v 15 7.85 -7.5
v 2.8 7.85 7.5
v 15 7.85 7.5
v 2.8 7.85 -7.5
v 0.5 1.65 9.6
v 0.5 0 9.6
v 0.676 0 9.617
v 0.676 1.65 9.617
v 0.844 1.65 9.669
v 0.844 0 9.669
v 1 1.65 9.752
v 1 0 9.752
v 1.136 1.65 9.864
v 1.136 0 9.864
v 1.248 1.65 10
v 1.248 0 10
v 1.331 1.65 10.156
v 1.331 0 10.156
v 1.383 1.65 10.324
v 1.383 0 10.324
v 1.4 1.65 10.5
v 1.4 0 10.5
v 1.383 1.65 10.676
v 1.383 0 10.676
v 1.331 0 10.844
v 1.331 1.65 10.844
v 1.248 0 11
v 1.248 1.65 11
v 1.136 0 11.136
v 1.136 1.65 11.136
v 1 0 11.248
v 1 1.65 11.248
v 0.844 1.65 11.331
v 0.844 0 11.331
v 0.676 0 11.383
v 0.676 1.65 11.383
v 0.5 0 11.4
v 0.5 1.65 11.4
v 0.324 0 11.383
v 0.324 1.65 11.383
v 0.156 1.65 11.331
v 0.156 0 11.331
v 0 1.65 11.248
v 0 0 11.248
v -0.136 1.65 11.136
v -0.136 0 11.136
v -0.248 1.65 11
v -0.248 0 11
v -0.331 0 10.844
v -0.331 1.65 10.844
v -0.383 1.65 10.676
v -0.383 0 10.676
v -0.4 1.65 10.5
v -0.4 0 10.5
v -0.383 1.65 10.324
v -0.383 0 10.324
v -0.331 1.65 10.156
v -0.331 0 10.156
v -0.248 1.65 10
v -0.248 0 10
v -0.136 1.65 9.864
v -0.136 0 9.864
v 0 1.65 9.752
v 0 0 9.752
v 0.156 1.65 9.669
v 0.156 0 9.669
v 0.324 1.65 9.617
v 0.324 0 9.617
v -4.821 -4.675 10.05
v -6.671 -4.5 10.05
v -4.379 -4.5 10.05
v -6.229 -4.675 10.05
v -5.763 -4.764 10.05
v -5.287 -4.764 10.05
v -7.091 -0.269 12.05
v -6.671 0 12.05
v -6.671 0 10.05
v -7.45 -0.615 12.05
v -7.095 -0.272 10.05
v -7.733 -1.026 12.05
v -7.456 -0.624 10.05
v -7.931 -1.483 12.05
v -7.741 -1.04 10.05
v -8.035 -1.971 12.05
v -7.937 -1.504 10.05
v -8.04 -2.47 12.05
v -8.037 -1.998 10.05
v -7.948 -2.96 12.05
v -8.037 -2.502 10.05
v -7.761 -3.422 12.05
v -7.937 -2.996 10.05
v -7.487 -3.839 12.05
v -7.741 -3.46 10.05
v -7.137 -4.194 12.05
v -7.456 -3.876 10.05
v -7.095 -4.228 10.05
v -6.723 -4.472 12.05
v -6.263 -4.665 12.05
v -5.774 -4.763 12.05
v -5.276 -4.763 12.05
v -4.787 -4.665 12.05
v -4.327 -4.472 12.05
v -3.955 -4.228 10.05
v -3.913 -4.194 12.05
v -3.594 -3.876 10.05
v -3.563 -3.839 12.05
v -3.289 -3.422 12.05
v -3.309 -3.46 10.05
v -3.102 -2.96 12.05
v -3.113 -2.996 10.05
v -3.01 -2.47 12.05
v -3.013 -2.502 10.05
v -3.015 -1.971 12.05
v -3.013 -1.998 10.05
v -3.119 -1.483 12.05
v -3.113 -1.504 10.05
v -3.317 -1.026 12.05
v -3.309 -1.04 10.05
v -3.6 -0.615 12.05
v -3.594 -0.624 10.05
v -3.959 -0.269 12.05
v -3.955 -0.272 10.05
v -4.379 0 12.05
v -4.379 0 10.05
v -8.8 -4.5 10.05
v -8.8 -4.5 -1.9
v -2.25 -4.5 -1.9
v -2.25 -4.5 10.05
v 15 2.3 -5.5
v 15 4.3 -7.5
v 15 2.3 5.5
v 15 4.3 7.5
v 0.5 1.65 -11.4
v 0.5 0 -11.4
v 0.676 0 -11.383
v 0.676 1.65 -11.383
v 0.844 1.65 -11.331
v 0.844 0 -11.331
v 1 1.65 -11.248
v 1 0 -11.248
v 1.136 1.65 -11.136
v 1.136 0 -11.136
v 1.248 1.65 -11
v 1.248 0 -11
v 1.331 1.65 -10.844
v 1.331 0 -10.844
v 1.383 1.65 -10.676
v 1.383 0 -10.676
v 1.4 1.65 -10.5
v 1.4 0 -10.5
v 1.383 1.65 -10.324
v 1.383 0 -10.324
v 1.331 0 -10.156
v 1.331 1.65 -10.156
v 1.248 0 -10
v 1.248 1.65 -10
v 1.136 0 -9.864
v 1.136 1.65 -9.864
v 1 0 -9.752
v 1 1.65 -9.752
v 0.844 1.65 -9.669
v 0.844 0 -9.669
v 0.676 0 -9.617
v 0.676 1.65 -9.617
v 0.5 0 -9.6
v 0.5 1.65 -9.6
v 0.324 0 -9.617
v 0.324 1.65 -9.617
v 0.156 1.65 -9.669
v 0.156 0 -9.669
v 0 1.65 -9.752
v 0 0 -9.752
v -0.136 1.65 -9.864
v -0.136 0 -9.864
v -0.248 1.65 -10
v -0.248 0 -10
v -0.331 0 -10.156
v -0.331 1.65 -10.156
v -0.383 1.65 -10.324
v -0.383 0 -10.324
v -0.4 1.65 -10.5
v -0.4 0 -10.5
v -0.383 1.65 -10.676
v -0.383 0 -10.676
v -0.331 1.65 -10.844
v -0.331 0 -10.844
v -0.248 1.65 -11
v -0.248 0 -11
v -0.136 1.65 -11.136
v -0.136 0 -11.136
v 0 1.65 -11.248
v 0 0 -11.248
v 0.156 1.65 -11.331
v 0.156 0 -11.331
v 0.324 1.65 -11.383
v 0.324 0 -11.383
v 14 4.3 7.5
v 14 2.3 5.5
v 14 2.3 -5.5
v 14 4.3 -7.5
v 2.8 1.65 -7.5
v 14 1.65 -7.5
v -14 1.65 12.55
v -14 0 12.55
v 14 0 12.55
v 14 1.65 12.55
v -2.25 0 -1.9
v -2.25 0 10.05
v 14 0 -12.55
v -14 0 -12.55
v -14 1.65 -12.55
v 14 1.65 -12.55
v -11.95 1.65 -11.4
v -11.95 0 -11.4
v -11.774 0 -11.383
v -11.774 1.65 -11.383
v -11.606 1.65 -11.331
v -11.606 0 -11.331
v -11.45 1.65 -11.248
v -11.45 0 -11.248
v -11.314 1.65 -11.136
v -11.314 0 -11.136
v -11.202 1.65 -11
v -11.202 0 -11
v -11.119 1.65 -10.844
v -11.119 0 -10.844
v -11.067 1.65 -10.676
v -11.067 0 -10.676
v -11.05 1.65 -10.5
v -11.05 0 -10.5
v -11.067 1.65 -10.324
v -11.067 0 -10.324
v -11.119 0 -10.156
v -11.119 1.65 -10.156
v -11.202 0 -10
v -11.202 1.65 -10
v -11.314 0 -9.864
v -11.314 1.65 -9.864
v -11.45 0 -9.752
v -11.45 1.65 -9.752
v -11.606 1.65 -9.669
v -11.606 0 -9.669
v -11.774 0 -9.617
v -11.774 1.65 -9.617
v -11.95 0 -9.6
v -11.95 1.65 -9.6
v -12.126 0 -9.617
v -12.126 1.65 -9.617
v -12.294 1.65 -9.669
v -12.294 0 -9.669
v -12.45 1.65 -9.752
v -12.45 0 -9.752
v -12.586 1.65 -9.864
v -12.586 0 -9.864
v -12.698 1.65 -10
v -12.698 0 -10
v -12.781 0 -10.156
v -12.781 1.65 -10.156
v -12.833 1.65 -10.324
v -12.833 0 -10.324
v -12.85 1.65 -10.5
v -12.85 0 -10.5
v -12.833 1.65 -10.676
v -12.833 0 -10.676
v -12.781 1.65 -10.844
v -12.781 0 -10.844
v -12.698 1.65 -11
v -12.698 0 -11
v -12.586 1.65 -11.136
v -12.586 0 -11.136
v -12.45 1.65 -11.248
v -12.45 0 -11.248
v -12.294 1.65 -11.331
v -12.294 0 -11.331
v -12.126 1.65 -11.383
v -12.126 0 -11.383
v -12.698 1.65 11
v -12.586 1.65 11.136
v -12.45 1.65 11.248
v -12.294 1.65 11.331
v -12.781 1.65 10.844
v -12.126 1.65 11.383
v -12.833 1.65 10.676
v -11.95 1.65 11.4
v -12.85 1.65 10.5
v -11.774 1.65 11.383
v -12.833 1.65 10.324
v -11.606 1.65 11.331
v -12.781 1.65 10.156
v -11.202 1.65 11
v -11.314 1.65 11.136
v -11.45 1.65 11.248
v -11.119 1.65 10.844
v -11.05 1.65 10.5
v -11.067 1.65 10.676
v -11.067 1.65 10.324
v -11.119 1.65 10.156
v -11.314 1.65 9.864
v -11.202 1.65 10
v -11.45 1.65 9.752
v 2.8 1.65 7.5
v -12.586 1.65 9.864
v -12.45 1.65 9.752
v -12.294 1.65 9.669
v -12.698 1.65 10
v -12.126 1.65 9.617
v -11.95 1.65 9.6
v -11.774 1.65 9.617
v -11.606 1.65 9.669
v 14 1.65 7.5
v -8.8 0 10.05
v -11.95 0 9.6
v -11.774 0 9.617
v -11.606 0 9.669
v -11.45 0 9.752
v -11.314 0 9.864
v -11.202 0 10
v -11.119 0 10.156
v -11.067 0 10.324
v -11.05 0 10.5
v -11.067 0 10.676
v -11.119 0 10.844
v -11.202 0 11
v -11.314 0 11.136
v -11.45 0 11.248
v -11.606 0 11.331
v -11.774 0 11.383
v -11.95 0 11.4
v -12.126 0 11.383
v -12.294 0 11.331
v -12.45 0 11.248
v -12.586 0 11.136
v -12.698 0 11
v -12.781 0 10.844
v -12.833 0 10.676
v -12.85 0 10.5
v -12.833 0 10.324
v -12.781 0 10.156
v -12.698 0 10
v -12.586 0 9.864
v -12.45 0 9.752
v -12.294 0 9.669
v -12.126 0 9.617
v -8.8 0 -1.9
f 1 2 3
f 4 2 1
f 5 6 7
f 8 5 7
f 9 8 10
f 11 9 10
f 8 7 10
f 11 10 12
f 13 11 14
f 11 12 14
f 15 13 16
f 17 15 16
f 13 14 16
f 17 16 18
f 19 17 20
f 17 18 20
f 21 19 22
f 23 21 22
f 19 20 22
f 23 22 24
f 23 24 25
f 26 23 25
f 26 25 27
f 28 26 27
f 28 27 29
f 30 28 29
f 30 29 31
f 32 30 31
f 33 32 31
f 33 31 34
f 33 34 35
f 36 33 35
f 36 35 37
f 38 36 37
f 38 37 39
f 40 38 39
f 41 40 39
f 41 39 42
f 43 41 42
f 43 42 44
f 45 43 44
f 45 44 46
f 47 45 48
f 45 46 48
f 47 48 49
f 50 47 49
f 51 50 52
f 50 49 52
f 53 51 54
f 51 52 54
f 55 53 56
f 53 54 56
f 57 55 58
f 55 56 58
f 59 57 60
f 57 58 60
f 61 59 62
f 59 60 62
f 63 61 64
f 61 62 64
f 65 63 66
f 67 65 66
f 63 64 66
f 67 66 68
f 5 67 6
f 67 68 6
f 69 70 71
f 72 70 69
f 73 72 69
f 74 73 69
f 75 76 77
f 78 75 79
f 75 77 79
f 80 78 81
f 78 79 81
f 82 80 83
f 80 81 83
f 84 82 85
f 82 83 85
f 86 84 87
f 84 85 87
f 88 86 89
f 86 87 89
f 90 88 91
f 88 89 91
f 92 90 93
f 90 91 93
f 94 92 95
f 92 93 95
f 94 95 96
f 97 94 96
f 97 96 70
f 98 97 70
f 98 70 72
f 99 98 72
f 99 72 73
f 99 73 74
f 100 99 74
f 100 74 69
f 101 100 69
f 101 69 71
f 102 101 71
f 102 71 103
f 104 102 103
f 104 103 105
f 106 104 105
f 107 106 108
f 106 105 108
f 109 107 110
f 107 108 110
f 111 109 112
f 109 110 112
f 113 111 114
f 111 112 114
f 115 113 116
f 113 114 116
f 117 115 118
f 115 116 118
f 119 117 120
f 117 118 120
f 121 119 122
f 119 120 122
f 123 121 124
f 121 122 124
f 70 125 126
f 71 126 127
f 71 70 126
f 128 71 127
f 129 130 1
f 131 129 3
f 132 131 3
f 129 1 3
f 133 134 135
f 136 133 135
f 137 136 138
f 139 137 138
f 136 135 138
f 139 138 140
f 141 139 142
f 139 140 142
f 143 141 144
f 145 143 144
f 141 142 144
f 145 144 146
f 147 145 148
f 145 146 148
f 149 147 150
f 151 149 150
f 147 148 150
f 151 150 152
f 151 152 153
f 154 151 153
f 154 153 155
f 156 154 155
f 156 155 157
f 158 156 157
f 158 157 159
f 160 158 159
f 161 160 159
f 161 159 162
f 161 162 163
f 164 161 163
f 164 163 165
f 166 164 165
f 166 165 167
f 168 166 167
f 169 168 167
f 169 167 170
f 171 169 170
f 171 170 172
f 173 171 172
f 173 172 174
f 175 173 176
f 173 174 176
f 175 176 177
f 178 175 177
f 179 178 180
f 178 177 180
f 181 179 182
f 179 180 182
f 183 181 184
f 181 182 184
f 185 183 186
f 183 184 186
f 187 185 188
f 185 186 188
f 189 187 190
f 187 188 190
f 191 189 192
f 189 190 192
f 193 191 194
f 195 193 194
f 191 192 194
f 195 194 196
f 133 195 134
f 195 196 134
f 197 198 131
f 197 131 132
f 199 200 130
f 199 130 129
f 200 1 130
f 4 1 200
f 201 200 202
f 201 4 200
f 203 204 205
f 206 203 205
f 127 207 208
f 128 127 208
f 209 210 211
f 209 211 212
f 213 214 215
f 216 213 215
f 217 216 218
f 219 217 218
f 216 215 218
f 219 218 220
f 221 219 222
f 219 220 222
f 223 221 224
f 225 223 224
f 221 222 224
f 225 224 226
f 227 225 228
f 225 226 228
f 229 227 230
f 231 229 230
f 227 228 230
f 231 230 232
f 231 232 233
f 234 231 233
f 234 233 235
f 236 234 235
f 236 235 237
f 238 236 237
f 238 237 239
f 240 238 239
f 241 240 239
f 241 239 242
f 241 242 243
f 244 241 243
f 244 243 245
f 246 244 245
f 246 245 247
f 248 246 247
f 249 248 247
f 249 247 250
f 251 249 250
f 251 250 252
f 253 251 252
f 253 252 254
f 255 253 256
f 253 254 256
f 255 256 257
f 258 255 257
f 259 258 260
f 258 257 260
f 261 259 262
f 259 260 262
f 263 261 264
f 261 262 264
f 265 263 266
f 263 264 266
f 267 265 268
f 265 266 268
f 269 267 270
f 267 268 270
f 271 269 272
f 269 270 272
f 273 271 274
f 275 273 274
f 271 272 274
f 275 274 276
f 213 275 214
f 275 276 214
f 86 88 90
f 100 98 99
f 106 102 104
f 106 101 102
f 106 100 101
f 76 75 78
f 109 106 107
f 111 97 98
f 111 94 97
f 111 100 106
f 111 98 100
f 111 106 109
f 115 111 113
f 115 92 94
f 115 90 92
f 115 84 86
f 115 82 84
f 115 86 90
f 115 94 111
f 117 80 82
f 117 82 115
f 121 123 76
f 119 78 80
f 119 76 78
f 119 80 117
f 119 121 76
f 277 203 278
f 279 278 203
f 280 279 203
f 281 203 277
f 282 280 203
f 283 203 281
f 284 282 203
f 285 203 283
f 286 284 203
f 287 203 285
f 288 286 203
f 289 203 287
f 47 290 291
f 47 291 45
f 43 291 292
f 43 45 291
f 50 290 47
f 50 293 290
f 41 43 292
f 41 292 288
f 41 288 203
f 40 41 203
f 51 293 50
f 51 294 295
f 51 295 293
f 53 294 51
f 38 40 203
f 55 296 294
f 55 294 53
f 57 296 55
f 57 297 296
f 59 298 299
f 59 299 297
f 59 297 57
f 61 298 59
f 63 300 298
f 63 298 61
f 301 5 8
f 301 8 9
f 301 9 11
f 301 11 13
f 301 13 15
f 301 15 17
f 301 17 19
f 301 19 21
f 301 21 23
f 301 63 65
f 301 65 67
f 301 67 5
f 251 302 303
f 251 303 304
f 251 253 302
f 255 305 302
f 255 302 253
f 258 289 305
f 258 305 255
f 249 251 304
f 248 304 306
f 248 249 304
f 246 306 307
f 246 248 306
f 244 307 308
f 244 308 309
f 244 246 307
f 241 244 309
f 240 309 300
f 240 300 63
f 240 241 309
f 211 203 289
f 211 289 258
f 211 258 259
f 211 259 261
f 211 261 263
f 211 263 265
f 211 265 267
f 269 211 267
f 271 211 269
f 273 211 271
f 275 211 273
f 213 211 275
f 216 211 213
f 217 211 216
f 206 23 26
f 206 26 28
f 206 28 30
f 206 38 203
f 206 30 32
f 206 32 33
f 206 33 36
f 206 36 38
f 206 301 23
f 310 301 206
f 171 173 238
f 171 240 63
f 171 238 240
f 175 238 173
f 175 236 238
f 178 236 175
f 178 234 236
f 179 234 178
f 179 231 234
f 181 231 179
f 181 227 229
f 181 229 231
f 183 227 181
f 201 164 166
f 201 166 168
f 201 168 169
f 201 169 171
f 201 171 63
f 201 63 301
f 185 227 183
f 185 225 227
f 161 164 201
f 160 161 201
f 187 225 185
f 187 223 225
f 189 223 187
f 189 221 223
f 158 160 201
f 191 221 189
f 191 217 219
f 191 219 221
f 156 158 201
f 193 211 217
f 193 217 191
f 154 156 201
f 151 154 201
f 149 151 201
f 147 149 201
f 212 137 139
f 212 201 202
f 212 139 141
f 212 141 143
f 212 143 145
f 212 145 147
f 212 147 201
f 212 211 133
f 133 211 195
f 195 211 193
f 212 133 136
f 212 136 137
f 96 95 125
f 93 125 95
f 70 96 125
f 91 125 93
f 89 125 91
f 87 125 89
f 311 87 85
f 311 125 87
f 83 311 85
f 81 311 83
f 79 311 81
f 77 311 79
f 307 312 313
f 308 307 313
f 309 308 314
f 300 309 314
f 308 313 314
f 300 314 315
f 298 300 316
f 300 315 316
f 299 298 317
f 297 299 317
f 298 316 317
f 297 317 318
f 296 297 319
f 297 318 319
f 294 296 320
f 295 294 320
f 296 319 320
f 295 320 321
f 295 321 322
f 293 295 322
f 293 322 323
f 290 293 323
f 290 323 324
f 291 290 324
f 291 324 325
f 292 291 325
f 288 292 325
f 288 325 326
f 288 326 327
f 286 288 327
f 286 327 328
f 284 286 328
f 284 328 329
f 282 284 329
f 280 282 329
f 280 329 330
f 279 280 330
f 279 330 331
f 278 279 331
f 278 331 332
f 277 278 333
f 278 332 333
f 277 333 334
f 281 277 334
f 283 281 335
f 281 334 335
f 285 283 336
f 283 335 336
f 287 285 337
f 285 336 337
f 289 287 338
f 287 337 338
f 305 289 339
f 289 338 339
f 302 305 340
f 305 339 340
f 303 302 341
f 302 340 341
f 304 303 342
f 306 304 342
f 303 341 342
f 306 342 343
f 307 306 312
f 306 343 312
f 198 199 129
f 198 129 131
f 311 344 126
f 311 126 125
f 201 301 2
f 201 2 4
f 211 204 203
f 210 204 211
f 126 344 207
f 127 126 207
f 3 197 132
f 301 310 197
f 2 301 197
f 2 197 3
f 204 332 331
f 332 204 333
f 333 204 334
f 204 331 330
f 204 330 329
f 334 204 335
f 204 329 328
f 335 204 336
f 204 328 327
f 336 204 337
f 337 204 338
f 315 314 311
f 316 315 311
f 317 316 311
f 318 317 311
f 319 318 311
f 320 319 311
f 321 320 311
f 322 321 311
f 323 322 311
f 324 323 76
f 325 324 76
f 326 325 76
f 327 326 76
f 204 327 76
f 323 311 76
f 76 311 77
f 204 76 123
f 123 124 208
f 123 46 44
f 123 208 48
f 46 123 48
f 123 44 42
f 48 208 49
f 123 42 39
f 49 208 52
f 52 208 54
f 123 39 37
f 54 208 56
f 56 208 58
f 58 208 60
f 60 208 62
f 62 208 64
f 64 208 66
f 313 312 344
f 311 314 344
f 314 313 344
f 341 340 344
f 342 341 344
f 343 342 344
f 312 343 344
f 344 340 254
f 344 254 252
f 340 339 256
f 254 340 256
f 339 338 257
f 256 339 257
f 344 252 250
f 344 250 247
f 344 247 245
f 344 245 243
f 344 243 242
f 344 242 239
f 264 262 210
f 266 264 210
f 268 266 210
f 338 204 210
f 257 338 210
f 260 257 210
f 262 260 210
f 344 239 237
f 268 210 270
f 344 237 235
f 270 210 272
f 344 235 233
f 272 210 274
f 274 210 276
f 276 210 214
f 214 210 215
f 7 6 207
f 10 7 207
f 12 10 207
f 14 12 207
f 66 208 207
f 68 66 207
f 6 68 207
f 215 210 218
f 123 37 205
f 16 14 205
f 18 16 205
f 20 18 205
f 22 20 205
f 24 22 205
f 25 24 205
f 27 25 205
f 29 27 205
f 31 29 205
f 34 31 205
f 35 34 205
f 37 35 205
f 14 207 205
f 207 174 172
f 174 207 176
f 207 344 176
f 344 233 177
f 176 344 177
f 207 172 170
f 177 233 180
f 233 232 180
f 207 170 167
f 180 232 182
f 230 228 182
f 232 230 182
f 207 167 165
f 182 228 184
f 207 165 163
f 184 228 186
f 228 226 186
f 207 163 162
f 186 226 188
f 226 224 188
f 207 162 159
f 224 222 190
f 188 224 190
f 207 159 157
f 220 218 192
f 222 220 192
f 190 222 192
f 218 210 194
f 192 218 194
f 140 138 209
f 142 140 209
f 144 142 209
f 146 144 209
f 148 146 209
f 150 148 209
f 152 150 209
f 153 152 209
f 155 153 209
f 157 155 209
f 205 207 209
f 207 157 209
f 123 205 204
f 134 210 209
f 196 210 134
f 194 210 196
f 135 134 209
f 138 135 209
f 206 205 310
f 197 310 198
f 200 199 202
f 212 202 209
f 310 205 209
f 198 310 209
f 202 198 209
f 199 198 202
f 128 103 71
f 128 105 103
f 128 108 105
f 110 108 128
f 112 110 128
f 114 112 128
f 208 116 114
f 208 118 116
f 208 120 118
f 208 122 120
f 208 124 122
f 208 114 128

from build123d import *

# Parameters (mm, degrees)
SKETCH1_W           = 28
SKETCH1_H           = 25.1
BOSS_EXTRUDE1_DEPTH = 1.65
SKETCH2_W           = 11.2
SKETCH2_H           = 15
BOSS_EXTRUDE2_DEPTH = 6.2
BOSS_EXTRUDE3_DEPTH = 1
SKETCH4_W           = 6.55
SKETCH4_H           = 11.95
BOSS_EXTRUDE4_DEPTH = 4.5
SKETCH5_R           = 2.525
BOSS_EXTRUDE5_DEPTH = 2
SKETCH6_R           = 0.9
CUT_EXTRUDE1_DEPTH  = 22.074273416


with BuildPart() as part:
    # Sketch1 → Boss-Extrude1 (new body)
    with BuildSketch(Plane(origin=(0, 0, 0), x_dir=(1, 0, 0), z_dir=(0, 1, 0))):
        Rectangle(SKETCH1_W, SKETCH1_H)
    extrude(amount=BOSS_EXTRUDE1_DEPTH)

    # Sketch2 → Boss-Extrude2 (add)
    with BuildSketch(Plane(origin=(0, 1.65, 0), x_dir=(1, 0, 0), z_dir=(0, 1, 0))):
        with Locations((8.4, 0)):
            Rectangle(SKETCH2_W, SKETCH2_H)
    extrude(amount=BOSS_EXTRUDE2_DEPTH)

    # Sketch3 → Boss-Extrude3 (add)
    with BuildSketch(Plane(origin=(14, 0, 0), x_dir=(0, 0, -1), z_dir=(1, 0, 0))):
        Polygon((-7.5, 4.3), (-7.5, 7.85), (7.5, 7.85), (7.5, 4.3), (5.5, 2.3), (-5.5, 2.3), align=None)
    extrude(amount=BOSS_EXTRUDE3_DEPTH)

    # Sketch4 → Boss-Extrude4 (add)
    with BuildSketch(Plane.XZ):
        with Locations((-5.525, 4.075)):
            Rectangle(SKETCH4_W, SKETCH4_H)
    extrude(amount=BOSS_EXTRUDE4_DEPTH)

    # Sketch5 → Boss-Extrude5 (add)
    with BuildSketch(Plane.XY.offset(10.05)):
        with Locations((-5.525, -2.25)):
            Circle(SKETCH5_R)
    extrude(amount=BOSS_EXTRUDE5_DEPTH)

    # Sketch6 → Cut-Extrude1 (cut, through all)
    with BuildSketch(Plane(origin=(0, 0, 0), x_dir=(-1, 0, 0), z_dir=(0, -1, 0))):
        with Locations(Location((11.95, -10.5, 0), (0, 0, 90))):
            Circle(SKETCH6_R)
        with Locations(Location((11.95, 10.5, 0), (0, 0, 90))):
            Circle(SKETCH6_R)
        with Locations(Location((-0.5, 10.5, 0), (0, 0, 90))):
            Circle(SKETCH6_R)
        with Locations(Location((-0.5, -10.5, 0), (0, 0, 90))):
            Circle(SKETCH6_R)
    extrude(amount=-CUT_EXTRUDE1_DEPTH, mode=Mode.SUBTRACT)


solid = part.part
